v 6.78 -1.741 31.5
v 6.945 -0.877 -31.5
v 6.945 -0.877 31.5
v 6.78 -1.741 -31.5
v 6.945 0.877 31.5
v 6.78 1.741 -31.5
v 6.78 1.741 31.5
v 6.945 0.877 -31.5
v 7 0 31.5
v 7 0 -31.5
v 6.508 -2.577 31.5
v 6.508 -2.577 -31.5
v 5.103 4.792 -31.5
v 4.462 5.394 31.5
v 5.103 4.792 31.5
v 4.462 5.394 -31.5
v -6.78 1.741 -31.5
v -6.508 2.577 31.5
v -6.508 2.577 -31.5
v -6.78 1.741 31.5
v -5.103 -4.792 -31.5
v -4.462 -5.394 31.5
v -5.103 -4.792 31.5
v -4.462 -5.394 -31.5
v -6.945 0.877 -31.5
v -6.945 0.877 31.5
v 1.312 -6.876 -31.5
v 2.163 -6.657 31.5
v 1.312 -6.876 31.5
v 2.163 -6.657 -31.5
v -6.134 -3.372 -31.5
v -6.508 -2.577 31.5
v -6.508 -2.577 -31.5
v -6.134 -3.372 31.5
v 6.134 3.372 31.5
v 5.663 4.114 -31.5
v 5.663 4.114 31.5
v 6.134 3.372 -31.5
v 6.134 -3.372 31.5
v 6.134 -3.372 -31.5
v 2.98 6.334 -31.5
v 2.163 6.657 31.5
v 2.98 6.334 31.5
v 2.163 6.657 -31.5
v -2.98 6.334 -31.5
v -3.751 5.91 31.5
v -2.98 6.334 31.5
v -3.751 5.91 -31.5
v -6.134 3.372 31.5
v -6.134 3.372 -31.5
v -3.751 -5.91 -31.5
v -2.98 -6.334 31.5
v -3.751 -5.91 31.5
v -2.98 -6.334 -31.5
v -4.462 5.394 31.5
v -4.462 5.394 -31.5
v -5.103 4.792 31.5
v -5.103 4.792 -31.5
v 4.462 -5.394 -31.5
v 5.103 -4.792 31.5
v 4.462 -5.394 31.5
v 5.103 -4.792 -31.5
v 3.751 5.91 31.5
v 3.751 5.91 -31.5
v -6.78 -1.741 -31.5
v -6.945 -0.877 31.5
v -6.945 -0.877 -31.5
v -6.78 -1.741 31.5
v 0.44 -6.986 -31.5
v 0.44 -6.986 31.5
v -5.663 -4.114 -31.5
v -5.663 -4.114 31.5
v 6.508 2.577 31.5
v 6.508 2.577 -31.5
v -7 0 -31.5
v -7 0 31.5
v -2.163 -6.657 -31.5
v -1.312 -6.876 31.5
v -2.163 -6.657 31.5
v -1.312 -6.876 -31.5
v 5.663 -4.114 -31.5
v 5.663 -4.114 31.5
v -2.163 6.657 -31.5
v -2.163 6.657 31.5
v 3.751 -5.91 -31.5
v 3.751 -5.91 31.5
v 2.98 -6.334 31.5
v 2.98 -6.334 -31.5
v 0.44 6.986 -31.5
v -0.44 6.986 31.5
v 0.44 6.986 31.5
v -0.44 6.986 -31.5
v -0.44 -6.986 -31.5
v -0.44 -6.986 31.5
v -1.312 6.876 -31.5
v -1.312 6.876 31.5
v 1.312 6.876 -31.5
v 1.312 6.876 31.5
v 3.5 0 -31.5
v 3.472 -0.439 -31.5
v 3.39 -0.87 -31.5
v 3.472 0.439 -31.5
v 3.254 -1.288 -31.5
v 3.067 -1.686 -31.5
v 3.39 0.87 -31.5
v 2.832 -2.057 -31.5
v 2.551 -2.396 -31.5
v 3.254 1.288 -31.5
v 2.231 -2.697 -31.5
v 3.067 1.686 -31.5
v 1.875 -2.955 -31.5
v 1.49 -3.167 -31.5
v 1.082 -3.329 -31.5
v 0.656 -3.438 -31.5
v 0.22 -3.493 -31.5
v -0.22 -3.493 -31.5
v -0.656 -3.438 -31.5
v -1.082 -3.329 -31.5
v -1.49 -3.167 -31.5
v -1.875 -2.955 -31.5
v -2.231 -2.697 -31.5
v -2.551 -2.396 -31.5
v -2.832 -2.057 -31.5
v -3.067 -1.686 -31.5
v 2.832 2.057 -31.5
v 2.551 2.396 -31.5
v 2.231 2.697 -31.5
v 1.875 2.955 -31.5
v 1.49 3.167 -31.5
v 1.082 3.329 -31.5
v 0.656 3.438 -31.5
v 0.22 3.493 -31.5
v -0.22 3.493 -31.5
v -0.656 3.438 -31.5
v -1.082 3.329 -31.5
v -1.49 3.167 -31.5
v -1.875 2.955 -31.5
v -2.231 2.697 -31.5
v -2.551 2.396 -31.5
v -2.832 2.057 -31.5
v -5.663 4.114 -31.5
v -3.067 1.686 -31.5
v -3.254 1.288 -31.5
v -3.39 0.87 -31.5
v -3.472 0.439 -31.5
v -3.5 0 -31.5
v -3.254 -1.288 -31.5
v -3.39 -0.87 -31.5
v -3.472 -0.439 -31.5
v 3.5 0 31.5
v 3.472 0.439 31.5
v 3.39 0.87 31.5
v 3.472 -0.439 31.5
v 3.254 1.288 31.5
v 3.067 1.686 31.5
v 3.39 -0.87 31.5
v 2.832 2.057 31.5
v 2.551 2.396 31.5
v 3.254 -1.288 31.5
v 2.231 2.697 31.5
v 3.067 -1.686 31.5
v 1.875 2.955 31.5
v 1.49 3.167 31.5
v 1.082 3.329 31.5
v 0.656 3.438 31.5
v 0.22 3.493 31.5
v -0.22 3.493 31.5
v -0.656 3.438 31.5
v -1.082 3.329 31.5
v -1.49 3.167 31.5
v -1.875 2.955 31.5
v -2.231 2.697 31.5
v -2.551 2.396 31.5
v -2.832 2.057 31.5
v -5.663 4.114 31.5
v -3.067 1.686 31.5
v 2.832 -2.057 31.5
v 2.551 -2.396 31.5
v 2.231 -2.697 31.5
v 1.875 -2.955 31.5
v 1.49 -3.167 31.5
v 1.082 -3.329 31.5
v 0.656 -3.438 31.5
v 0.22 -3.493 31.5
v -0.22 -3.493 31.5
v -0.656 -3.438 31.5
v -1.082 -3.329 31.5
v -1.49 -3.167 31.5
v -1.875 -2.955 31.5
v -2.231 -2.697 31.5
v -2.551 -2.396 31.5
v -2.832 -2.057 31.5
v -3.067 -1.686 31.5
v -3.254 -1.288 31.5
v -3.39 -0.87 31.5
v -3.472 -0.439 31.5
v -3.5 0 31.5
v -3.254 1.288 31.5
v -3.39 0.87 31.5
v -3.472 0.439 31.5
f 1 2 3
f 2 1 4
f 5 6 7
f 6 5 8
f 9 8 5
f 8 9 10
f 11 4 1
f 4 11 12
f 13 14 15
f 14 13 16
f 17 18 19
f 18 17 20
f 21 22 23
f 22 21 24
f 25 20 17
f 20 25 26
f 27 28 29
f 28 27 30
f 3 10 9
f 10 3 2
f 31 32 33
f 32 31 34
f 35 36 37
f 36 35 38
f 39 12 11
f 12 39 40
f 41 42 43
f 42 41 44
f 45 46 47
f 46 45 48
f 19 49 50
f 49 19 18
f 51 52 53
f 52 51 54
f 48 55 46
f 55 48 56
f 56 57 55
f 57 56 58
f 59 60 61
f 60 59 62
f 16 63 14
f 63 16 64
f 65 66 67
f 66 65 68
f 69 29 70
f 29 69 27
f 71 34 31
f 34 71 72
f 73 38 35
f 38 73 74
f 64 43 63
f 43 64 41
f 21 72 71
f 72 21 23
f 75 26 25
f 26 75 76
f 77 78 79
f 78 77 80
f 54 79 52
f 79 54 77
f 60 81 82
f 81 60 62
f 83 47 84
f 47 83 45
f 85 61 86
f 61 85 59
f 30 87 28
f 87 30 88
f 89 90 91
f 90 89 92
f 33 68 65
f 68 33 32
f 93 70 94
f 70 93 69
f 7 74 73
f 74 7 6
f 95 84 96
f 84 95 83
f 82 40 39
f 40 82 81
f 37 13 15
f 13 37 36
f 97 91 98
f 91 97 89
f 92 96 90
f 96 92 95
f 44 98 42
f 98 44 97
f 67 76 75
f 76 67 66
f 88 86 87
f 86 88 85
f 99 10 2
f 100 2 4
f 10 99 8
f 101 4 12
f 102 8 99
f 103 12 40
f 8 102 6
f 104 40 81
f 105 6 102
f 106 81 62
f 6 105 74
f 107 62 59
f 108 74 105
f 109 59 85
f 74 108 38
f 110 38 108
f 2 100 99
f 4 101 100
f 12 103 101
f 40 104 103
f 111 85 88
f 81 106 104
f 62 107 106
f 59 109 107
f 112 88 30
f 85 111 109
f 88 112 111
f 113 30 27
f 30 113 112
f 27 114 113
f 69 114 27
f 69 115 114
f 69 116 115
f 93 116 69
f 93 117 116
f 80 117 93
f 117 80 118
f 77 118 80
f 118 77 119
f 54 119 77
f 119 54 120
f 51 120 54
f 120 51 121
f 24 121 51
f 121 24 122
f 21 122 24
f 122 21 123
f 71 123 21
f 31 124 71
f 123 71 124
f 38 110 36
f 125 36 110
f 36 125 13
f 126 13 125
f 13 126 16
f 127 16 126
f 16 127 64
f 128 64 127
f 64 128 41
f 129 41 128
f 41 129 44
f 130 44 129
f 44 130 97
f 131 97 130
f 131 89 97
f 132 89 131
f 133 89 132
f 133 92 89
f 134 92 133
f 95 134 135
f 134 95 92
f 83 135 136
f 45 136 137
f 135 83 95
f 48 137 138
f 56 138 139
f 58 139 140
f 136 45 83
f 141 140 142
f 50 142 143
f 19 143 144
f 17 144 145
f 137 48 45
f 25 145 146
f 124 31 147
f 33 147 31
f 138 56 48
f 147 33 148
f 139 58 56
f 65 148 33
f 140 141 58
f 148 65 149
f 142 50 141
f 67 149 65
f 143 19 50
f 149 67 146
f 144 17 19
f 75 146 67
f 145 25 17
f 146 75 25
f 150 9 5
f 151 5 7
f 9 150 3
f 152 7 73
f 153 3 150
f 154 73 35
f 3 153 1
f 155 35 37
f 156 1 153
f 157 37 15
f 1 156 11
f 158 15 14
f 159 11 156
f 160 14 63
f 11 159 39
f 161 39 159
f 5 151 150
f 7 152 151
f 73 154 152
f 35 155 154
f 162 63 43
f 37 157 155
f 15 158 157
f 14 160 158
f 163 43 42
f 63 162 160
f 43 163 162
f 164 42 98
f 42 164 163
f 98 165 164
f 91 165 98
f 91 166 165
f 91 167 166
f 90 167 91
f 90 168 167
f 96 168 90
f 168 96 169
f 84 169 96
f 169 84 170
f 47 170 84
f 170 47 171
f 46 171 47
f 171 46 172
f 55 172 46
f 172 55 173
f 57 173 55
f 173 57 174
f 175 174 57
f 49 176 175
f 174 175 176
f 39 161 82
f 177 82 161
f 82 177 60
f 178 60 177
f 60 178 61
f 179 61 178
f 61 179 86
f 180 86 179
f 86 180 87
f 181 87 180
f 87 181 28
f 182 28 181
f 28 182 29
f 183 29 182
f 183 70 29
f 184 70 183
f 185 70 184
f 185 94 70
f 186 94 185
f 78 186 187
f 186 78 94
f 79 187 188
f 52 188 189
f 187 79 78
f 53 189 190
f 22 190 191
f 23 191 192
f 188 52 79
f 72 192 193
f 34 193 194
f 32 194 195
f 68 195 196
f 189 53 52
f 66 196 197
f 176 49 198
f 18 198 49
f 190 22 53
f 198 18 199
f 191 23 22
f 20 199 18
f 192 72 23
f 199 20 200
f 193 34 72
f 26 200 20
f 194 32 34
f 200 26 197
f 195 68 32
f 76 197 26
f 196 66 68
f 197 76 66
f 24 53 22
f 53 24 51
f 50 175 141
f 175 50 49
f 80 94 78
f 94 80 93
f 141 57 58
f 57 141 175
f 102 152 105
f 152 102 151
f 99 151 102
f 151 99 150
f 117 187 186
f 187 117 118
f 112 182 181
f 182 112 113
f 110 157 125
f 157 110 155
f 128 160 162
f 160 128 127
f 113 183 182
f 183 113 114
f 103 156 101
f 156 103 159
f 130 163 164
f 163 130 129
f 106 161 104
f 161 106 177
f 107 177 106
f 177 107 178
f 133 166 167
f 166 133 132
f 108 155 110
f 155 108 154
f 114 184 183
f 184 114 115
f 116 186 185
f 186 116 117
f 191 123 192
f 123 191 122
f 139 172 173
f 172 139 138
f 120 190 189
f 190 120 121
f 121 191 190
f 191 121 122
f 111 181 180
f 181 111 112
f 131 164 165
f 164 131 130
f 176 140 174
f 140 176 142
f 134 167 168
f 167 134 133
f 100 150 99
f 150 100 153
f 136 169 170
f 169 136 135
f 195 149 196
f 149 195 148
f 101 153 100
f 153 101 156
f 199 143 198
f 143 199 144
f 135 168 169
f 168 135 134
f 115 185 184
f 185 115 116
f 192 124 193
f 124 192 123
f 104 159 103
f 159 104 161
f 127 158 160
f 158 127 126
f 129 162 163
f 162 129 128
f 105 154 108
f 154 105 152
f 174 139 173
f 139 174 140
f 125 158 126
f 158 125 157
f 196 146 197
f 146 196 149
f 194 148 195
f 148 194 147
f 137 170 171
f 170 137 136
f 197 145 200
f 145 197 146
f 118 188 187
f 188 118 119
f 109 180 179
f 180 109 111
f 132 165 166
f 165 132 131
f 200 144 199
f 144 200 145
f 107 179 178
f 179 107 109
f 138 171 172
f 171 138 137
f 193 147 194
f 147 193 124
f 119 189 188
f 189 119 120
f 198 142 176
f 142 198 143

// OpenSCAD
$fn = 50;


difference() {
	union() {
		translate(v = [0, 0, -31.5000000000]) {
			cylinder(h = 63, r = 7.0000000000);
		}
	}
	union() {
		translate(v = [0, 0, -100.0000000000]) {
			cylinder(h = 200, r = 3.5000000000);
		}
	}
}
